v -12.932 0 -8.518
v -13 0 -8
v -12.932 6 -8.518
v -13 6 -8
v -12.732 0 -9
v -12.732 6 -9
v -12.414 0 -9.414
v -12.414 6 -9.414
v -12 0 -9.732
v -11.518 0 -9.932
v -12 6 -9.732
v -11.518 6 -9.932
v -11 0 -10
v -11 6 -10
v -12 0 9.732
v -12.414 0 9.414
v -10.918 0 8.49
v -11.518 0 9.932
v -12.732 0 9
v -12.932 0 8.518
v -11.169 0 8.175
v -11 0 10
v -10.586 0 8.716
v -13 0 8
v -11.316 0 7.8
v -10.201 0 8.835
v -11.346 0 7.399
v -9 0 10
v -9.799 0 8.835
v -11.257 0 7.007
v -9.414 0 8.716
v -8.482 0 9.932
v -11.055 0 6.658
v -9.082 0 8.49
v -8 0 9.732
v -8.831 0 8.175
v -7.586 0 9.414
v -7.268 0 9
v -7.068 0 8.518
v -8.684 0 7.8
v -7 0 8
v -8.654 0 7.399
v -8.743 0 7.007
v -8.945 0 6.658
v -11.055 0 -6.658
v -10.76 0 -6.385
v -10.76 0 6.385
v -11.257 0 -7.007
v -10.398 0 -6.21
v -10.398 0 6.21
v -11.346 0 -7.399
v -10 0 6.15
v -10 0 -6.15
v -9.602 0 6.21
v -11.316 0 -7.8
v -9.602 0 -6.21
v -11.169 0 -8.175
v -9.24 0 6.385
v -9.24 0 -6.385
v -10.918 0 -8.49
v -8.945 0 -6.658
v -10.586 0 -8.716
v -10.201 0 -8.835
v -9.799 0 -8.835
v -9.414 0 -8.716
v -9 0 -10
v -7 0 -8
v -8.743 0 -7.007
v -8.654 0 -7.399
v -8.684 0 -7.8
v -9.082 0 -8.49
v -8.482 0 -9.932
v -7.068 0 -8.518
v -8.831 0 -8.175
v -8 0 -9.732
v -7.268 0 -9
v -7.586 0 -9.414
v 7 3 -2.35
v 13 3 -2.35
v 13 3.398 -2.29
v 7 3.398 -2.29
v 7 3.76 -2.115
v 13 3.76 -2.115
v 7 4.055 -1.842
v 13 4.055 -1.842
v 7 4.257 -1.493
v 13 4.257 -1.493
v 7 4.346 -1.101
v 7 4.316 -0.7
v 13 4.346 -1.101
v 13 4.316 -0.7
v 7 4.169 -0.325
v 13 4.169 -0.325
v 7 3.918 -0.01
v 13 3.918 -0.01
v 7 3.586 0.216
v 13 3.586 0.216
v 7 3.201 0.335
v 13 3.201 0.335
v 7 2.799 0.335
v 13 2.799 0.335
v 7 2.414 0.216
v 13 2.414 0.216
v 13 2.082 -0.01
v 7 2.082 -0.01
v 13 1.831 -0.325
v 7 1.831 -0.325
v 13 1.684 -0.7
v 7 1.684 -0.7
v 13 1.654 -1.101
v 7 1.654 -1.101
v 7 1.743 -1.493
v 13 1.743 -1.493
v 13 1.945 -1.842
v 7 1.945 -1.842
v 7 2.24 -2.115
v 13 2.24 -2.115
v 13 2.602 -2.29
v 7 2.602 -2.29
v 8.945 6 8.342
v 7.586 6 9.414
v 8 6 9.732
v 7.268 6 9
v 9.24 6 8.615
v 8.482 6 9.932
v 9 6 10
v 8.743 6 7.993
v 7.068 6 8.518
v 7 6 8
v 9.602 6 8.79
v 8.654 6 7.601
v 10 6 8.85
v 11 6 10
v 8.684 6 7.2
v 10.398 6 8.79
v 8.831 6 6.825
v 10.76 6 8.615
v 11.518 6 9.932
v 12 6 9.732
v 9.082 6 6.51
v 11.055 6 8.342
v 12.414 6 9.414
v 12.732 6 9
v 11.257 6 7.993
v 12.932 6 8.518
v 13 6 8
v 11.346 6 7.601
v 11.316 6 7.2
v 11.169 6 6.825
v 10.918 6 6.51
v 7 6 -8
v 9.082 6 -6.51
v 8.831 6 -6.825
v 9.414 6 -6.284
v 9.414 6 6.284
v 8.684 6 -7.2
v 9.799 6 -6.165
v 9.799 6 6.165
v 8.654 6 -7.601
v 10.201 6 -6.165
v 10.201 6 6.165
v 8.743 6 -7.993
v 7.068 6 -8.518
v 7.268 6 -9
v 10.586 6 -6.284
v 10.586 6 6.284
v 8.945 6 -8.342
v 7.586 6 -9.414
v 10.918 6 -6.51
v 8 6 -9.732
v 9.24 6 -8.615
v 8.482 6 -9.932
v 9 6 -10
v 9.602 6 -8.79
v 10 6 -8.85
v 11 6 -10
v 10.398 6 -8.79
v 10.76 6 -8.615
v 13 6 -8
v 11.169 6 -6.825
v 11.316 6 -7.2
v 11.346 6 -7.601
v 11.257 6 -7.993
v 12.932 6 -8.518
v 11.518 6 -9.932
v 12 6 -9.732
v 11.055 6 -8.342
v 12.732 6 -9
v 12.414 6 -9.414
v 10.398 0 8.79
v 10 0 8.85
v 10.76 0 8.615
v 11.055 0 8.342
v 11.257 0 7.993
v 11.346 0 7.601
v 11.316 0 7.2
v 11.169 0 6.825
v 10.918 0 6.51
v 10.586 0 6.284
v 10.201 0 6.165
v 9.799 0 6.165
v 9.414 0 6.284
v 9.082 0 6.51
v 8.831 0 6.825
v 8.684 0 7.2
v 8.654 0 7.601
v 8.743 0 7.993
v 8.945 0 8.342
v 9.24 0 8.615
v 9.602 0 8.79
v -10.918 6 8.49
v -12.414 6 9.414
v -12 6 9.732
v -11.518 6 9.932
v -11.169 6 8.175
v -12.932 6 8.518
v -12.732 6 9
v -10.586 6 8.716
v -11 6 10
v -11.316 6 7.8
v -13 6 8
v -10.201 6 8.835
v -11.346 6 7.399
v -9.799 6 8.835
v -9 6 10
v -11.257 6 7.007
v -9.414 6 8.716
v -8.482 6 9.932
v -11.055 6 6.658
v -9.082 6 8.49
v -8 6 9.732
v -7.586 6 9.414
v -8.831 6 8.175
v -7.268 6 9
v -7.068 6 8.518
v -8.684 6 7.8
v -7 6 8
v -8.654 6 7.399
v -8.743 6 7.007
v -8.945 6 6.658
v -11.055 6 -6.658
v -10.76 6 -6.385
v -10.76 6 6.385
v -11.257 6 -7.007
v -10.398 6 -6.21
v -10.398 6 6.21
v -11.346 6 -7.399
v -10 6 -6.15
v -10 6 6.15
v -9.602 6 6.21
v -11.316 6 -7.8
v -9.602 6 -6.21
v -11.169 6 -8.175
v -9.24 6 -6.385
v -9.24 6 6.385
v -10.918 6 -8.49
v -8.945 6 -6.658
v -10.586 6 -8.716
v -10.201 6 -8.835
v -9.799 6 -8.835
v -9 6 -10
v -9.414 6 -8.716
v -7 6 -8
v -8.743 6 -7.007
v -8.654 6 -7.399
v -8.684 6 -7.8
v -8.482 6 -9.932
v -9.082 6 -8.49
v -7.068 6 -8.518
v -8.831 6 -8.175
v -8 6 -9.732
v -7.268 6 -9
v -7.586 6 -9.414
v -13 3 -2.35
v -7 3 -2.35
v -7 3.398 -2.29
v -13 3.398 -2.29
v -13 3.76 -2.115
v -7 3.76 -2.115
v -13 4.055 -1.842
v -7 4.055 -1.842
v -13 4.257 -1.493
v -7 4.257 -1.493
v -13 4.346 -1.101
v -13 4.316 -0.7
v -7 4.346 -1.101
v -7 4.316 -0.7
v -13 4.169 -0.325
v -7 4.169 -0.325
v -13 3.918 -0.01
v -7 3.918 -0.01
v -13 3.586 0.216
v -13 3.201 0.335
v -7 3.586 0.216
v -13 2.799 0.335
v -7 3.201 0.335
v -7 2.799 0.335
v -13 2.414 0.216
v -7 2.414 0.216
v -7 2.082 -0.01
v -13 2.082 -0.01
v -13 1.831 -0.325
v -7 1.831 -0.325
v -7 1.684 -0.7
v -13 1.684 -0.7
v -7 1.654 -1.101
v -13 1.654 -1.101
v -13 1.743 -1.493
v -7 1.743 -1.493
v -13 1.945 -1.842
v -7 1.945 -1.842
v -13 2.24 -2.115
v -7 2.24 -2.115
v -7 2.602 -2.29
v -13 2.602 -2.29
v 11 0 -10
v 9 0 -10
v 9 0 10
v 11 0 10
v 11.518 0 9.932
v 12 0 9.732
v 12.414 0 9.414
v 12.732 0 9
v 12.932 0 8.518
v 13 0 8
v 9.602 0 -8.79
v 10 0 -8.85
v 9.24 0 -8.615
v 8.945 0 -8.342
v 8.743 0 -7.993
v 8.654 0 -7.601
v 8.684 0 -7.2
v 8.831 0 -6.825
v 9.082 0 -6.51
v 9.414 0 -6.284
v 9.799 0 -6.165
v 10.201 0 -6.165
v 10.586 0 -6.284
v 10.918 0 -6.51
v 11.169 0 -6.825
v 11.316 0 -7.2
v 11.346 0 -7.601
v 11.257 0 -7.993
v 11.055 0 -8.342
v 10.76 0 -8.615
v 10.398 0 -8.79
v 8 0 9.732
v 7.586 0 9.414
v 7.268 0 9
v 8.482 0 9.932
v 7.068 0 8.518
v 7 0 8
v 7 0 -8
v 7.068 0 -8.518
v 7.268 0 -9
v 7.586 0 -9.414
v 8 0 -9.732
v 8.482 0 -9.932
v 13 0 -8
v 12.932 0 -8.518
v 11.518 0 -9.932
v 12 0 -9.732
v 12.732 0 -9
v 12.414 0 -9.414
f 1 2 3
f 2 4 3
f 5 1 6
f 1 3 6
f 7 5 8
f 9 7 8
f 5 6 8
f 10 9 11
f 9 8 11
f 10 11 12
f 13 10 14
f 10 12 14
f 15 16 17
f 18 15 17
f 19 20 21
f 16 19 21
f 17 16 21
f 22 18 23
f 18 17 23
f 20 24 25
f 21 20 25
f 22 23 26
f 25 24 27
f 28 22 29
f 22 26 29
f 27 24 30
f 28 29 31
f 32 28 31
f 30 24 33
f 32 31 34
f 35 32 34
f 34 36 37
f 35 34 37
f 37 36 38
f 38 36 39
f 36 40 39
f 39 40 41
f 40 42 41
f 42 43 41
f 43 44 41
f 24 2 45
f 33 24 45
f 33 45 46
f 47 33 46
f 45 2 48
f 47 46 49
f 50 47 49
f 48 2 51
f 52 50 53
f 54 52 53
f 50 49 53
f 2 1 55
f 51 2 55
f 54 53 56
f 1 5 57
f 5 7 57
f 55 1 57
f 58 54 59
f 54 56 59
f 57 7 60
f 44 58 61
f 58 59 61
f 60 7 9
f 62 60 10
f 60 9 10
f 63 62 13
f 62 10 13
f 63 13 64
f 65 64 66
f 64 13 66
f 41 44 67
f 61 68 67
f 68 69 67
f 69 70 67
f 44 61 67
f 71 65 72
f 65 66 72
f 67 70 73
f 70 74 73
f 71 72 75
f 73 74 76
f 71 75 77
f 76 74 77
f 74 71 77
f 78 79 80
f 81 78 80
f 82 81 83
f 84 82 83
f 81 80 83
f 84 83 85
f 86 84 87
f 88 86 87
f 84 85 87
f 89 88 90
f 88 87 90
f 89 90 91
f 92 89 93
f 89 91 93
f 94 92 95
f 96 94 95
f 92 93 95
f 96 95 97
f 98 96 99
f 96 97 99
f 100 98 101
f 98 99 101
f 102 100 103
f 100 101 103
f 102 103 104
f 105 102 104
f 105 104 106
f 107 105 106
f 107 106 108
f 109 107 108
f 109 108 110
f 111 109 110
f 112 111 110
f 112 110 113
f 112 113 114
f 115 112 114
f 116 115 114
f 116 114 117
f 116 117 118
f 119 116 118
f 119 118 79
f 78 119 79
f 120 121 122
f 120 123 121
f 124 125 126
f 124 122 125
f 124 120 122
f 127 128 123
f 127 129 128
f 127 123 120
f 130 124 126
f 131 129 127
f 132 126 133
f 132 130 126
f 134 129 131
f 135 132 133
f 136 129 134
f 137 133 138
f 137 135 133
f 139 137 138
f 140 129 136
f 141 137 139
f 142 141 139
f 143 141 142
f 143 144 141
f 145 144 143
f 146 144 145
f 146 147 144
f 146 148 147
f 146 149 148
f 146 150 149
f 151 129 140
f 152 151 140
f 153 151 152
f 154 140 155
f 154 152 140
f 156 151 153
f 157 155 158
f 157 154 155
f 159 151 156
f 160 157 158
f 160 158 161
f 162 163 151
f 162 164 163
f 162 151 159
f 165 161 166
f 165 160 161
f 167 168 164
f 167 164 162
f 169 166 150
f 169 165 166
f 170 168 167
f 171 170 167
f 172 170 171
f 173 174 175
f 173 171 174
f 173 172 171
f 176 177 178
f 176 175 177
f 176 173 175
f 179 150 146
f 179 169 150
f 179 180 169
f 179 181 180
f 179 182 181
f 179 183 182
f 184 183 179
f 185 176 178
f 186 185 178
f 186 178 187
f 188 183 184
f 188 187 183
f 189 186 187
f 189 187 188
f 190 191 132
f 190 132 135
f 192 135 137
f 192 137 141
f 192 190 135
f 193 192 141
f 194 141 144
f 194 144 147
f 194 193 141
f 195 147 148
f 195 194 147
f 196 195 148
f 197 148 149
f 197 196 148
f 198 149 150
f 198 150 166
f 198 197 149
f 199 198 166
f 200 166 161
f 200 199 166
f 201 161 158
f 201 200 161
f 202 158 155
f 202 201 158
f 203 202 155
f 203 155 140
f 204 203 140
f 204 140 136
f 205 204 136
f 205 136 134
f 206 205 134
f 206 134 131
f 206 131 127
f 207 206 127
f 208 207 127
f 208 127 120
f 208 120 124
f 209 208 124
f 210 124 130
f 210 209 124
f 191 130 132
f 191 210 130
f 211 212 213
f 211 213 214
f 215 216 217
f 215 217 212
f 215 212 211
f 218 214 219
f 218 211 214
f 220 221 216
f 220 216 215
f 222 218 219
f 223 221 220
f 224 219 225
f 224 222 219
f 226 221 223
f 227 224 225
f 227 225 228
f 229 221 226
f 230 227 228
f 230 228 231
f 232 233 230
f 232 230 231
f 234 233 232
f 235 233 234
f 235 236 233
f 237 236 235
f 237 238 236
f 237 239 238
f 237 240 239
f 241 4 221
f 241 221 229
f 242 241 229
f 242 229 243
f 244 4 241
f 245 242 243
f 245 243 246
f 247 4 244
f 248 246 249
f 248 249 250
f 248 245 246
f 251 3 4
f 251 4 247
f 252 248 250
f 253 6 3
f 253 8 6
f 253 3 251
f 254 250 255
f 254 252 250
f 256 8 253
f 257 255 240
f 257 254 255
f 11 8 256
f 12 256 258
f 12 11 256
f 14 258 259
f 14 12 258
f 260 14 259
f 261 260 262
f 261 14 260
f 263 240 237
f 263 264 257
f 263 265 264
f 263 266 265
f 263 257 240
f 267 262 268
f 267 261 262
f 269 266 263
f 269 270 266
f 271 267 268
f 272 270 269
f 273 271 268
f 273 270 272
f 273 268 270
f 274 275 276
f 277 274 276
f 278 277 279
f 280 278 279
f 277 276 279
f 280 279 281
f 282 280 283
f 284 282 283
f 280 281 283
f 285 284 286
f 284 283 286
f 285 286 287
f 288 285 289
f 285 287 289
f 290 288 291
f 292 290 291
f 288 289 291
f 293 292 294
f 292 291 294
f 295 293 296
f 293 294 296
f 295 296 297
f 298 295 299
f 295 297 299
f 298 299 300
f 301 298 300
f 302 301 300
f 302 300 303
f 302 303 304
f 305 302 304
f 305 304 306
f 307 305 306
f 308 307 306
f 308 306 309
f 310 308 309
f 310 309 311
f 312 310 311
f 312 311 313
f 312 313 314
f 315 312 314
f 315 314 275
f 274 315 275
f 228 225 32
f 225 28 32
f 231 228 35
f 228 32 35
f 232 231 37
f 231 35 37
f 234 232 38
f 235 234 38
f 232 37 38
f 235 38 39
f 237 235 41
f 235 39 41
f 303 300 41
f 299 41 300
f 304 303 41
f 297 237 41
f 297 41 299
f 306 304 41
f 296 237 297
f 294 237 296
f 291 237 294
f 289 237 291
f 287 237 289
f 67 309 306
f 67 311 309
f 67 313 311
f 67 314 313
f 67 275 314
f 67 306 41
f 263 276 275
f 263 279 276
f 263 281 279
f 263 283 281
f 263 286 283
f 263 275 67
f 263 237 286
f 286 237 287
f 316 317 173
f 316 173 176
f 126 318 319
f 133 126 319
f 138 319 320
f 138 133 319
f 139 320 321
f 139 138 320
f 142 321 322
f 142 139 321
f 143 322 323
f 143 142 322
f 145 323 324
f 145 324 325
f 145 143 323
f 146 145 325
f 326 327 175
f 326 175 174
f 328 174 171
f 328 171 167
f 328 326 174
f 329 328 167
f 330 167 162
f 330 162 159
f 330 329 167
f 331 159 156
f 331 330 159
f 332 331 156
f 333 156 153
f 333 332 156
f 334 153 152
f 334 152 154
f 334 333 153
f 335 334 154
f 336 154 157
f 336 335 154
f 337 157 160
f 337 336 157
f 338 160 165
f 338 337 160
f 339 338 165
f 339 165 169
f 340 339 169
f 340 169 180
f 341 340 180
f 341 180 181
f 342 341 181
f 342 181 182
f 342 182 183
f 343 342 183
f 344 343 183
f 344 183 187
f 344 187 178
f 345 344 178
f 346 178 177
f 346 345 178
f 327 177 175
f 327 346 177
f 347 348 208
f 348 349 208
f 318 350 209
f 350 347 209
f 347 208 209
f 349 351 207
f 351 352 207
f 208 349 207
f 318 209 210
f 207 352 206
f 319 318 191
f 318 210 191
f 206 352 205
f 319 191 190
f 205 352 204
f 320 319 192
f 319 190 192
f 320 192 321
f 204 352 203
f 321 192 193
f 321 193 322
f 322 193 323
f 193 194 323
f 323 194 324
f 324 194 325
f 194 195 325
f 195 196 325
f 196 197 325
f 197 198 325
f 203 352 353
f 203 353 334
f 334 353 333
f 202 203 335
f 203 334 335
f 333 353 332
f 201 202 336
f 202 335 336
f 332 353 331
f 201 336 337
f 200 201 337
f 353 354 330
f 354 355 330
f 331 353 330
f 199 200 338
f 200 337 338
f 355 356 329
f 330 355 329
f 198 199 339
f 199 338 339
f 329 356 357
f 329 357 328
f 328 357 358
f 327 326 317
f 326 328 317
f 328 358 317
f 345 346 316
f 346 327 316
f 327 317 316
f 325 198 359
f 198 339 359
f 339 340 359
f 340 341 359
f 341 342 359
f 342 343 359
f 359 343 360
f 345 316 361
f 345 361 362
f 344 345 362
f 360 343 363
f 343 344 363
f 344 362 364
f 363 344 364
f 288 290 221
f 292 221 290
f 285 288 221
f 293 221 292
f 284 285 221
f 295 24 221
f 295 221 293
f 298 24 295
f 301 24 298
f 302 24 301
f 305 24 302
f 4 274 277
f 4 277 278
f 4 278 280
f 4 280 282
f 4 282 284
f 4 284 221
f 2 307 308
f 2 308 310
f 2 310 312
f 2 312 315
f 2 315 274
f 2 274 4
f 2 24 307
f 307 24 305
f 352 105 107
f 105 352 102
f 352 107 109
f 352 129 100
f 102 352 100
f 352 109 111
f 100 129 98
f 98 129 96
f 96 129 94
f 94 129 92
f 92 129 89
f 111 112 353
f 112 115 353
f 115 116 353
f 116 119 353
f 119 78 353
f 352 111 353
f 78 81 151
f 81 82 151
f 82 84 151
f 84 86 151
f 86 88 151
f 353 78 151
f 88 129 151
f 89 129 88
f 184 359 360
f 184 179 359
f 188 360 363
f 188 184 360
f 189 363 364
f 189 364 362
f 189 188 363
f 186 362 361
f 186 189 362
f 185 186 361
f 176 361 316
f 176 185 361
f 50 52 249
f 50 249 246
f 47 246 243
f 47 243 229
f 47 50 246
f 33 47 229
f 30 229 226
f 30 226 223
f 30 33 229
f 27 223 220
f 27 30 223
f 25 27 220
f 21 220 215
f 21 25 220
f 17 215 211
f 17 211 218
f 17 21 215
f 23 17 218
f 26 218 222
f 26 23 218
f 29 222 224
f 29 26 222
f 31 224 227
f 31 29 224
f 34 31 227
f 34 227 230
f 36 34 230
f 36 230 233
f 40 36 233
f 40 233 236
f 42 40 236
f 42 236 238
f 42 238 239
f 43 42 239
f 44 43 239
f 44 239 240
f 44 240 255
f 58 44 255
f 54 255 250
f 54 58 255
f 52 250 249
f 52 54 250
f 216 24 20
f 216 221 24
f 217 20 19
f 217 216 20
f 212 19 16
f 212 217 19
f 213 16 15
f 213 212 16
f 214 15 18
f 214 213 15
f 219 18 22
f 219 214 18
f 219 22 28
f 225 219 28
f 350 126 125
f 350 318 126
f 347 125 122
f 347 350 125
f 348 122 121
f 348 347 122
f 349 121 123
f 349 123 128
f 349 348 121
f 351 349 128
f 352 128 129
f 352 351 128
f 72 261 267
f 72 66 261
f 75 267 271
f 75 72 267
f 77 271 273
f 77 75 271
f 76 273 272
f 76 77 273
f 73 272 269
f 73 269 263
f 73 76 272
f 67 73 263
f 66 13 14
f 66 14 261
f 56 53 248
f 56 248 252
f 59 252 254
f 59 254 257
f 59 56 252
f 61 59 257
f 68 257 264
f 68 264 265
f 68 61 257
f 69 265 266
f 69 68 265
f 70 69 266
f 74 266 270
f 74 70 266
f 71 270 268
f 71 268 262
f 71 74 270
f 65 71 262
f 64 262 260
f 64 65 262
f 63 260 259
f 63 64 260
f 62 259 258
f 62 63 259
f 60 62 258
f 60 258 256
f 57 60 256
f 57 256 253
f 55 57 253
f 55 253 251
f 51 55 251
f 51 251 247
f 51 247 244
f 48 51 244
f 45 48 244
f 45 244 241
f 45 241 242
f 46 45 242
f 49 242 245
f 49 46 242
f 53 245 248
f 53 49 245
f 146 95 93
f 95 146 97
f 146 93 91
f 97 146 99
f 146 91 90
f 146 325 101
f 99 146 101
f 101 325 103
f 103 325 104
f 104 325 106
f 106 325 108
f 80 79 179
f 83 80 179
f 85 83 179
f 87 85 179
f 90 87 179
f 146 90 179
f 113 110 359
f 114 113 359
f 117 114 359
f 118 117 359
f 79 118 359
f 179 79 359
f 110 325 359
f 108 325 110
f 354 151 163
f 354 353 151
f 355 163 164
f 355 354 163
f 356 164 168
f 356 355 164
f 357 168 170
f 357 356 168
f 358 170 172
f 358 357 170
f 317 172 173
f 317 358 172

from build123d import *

# Parameters (mm, degrees)
SKETCH_1_W          = 26
SKETCH_1_H          = 20
SKETCH_1_R          = 1.35
EXTRUDE_1_DEPTH     = 6
SKETCH_2_W          = 14
SKETCH_2_H          = 20
CUT_EXTRUDE_1_DEPTH = 18.464249197
SKETCH_5_R          = 1.35
CUT_EXTRUDE_2_DEPTH = 29.495613698
FILLET_1_R          = 2
FILLET_2_R          = 2


with BuildPart() as part:
    # 草图1 → 凸台-拉伸1 (new body)
    with BuildSketch(Plane(origin=(0, 0, 0), x_dir=(1, 0, 0), z_dir=(0, 1, 0))):
        Rectangle(SKETCH_1_W, SKETCH_1_H)
        with Locations(Location((-10, 7.5, 0), (0, 0, 270))):
            Circle(SKETCH_1_R, mode=Mode.SUBTRACT)
        with Locations(Location((10, 7.5, 0), (0, 0, 90))):
            Circle(SKETCH_1_R, mode=Mode.SUBTRACT)
        with Locations(Location((10, -7.5, 0), (0, 0, 270))):
            Circle(SKETCH_1_R, mode=Mode.SUBTRACT)
        with Locations(Location((-10, -7.5, 0), (0, 0, 90))):
            Circle(SKETCH_1_R, mode=Mode.SUBTRACT)
    extrude(amount=EXTRUDE_1_DEPTH)

    # 草图2 → 切除-拉伸1 (cut, through all)
    with BuildSketch(Plane(origin=(0, 6, 0), x_dir=(1, 0, 0), z_dir=(0, 1, 0))):
        Rectangle(SKETCH_2_W, SKETCH_2_H)
    extrude(amount=-CUT_EXTRUDE_1_DEPTH, mode=Mode.SUBTRACT)


with BuildPart() as cut_extrude_1_piece_1:
    # of the separate pieces the step leaves, piece 1, a body of its own (cut_extrude_1_pieces)
    add(part.part.solids().sort_by_distance((7, 0, 10))[0])


with BuildPart() as cut_extrude_1_piece_2:
    # of the separate pieces the step leaves, piece 2, a body of its own (cut_extrude_1_pieces)
    add(part.part.solids().sort_by_distance((-13, 0, 10))[0])


with BuildPart() as cut_extrude_2_tool:
    # 草图5 → 切除-拉伸2 (new, through all)
    with BuildSketch(Plane(origin=(13, 0, 0), x_dir=(0, 0, -1), z_dir=(1, 0, 0))):
        with Locations((1, 3)):
            Circle(SKETCH_5_R)
    extrude(amount=-CUT_EXTRUDE_2_DEPTH)


with BuildPart() as cut_extrude_1_piece_1_1:
    add(cut_extrude_1_piece_1.part)

    # 切除-拉伸2: cut by cut_extrude_2_tool
    add(cut_extrude_2_tool.part, mode=Mode.SUBTRACT)

    # 圆角1
    fillet_1_edges = [cut_extrude_1_piece_1_1.edges().sort_by_distance(p)[0] for p in [
        (7, 3, -10),
        (7, 3, 10),
        (13, 3, 10),
        (13, 3, -10),
    ]]
    fillet(fillet_1_edges, radius=FILLET_1_R)


with BuildPart() as cut_extrude_1_piece_2_1:
    add(cut_extrude_1_piece_2.part)

    # 切除-拉伸2: cut by cut_extrude_2_tool
    add(cut_extrude_2_tool.part, mode=Mode.SUBTRACT)

    # 圆角2
    fillet_2_edges = [cut_extrude_1_piece_2_1.edges().sort_by_distance(p)[0] for p in [
        (-7, 3, 10),
        (-13, 3, 10),
        (-13, 3, -10),
        (-7, 3, -10),
    ]]
    fillet(fillet_2_edges, radius=FILLET_2_R)


solid = Compound([cut_extrude_1_piece_1_1.part, cut_extrude_1_piece_2_1.part])
